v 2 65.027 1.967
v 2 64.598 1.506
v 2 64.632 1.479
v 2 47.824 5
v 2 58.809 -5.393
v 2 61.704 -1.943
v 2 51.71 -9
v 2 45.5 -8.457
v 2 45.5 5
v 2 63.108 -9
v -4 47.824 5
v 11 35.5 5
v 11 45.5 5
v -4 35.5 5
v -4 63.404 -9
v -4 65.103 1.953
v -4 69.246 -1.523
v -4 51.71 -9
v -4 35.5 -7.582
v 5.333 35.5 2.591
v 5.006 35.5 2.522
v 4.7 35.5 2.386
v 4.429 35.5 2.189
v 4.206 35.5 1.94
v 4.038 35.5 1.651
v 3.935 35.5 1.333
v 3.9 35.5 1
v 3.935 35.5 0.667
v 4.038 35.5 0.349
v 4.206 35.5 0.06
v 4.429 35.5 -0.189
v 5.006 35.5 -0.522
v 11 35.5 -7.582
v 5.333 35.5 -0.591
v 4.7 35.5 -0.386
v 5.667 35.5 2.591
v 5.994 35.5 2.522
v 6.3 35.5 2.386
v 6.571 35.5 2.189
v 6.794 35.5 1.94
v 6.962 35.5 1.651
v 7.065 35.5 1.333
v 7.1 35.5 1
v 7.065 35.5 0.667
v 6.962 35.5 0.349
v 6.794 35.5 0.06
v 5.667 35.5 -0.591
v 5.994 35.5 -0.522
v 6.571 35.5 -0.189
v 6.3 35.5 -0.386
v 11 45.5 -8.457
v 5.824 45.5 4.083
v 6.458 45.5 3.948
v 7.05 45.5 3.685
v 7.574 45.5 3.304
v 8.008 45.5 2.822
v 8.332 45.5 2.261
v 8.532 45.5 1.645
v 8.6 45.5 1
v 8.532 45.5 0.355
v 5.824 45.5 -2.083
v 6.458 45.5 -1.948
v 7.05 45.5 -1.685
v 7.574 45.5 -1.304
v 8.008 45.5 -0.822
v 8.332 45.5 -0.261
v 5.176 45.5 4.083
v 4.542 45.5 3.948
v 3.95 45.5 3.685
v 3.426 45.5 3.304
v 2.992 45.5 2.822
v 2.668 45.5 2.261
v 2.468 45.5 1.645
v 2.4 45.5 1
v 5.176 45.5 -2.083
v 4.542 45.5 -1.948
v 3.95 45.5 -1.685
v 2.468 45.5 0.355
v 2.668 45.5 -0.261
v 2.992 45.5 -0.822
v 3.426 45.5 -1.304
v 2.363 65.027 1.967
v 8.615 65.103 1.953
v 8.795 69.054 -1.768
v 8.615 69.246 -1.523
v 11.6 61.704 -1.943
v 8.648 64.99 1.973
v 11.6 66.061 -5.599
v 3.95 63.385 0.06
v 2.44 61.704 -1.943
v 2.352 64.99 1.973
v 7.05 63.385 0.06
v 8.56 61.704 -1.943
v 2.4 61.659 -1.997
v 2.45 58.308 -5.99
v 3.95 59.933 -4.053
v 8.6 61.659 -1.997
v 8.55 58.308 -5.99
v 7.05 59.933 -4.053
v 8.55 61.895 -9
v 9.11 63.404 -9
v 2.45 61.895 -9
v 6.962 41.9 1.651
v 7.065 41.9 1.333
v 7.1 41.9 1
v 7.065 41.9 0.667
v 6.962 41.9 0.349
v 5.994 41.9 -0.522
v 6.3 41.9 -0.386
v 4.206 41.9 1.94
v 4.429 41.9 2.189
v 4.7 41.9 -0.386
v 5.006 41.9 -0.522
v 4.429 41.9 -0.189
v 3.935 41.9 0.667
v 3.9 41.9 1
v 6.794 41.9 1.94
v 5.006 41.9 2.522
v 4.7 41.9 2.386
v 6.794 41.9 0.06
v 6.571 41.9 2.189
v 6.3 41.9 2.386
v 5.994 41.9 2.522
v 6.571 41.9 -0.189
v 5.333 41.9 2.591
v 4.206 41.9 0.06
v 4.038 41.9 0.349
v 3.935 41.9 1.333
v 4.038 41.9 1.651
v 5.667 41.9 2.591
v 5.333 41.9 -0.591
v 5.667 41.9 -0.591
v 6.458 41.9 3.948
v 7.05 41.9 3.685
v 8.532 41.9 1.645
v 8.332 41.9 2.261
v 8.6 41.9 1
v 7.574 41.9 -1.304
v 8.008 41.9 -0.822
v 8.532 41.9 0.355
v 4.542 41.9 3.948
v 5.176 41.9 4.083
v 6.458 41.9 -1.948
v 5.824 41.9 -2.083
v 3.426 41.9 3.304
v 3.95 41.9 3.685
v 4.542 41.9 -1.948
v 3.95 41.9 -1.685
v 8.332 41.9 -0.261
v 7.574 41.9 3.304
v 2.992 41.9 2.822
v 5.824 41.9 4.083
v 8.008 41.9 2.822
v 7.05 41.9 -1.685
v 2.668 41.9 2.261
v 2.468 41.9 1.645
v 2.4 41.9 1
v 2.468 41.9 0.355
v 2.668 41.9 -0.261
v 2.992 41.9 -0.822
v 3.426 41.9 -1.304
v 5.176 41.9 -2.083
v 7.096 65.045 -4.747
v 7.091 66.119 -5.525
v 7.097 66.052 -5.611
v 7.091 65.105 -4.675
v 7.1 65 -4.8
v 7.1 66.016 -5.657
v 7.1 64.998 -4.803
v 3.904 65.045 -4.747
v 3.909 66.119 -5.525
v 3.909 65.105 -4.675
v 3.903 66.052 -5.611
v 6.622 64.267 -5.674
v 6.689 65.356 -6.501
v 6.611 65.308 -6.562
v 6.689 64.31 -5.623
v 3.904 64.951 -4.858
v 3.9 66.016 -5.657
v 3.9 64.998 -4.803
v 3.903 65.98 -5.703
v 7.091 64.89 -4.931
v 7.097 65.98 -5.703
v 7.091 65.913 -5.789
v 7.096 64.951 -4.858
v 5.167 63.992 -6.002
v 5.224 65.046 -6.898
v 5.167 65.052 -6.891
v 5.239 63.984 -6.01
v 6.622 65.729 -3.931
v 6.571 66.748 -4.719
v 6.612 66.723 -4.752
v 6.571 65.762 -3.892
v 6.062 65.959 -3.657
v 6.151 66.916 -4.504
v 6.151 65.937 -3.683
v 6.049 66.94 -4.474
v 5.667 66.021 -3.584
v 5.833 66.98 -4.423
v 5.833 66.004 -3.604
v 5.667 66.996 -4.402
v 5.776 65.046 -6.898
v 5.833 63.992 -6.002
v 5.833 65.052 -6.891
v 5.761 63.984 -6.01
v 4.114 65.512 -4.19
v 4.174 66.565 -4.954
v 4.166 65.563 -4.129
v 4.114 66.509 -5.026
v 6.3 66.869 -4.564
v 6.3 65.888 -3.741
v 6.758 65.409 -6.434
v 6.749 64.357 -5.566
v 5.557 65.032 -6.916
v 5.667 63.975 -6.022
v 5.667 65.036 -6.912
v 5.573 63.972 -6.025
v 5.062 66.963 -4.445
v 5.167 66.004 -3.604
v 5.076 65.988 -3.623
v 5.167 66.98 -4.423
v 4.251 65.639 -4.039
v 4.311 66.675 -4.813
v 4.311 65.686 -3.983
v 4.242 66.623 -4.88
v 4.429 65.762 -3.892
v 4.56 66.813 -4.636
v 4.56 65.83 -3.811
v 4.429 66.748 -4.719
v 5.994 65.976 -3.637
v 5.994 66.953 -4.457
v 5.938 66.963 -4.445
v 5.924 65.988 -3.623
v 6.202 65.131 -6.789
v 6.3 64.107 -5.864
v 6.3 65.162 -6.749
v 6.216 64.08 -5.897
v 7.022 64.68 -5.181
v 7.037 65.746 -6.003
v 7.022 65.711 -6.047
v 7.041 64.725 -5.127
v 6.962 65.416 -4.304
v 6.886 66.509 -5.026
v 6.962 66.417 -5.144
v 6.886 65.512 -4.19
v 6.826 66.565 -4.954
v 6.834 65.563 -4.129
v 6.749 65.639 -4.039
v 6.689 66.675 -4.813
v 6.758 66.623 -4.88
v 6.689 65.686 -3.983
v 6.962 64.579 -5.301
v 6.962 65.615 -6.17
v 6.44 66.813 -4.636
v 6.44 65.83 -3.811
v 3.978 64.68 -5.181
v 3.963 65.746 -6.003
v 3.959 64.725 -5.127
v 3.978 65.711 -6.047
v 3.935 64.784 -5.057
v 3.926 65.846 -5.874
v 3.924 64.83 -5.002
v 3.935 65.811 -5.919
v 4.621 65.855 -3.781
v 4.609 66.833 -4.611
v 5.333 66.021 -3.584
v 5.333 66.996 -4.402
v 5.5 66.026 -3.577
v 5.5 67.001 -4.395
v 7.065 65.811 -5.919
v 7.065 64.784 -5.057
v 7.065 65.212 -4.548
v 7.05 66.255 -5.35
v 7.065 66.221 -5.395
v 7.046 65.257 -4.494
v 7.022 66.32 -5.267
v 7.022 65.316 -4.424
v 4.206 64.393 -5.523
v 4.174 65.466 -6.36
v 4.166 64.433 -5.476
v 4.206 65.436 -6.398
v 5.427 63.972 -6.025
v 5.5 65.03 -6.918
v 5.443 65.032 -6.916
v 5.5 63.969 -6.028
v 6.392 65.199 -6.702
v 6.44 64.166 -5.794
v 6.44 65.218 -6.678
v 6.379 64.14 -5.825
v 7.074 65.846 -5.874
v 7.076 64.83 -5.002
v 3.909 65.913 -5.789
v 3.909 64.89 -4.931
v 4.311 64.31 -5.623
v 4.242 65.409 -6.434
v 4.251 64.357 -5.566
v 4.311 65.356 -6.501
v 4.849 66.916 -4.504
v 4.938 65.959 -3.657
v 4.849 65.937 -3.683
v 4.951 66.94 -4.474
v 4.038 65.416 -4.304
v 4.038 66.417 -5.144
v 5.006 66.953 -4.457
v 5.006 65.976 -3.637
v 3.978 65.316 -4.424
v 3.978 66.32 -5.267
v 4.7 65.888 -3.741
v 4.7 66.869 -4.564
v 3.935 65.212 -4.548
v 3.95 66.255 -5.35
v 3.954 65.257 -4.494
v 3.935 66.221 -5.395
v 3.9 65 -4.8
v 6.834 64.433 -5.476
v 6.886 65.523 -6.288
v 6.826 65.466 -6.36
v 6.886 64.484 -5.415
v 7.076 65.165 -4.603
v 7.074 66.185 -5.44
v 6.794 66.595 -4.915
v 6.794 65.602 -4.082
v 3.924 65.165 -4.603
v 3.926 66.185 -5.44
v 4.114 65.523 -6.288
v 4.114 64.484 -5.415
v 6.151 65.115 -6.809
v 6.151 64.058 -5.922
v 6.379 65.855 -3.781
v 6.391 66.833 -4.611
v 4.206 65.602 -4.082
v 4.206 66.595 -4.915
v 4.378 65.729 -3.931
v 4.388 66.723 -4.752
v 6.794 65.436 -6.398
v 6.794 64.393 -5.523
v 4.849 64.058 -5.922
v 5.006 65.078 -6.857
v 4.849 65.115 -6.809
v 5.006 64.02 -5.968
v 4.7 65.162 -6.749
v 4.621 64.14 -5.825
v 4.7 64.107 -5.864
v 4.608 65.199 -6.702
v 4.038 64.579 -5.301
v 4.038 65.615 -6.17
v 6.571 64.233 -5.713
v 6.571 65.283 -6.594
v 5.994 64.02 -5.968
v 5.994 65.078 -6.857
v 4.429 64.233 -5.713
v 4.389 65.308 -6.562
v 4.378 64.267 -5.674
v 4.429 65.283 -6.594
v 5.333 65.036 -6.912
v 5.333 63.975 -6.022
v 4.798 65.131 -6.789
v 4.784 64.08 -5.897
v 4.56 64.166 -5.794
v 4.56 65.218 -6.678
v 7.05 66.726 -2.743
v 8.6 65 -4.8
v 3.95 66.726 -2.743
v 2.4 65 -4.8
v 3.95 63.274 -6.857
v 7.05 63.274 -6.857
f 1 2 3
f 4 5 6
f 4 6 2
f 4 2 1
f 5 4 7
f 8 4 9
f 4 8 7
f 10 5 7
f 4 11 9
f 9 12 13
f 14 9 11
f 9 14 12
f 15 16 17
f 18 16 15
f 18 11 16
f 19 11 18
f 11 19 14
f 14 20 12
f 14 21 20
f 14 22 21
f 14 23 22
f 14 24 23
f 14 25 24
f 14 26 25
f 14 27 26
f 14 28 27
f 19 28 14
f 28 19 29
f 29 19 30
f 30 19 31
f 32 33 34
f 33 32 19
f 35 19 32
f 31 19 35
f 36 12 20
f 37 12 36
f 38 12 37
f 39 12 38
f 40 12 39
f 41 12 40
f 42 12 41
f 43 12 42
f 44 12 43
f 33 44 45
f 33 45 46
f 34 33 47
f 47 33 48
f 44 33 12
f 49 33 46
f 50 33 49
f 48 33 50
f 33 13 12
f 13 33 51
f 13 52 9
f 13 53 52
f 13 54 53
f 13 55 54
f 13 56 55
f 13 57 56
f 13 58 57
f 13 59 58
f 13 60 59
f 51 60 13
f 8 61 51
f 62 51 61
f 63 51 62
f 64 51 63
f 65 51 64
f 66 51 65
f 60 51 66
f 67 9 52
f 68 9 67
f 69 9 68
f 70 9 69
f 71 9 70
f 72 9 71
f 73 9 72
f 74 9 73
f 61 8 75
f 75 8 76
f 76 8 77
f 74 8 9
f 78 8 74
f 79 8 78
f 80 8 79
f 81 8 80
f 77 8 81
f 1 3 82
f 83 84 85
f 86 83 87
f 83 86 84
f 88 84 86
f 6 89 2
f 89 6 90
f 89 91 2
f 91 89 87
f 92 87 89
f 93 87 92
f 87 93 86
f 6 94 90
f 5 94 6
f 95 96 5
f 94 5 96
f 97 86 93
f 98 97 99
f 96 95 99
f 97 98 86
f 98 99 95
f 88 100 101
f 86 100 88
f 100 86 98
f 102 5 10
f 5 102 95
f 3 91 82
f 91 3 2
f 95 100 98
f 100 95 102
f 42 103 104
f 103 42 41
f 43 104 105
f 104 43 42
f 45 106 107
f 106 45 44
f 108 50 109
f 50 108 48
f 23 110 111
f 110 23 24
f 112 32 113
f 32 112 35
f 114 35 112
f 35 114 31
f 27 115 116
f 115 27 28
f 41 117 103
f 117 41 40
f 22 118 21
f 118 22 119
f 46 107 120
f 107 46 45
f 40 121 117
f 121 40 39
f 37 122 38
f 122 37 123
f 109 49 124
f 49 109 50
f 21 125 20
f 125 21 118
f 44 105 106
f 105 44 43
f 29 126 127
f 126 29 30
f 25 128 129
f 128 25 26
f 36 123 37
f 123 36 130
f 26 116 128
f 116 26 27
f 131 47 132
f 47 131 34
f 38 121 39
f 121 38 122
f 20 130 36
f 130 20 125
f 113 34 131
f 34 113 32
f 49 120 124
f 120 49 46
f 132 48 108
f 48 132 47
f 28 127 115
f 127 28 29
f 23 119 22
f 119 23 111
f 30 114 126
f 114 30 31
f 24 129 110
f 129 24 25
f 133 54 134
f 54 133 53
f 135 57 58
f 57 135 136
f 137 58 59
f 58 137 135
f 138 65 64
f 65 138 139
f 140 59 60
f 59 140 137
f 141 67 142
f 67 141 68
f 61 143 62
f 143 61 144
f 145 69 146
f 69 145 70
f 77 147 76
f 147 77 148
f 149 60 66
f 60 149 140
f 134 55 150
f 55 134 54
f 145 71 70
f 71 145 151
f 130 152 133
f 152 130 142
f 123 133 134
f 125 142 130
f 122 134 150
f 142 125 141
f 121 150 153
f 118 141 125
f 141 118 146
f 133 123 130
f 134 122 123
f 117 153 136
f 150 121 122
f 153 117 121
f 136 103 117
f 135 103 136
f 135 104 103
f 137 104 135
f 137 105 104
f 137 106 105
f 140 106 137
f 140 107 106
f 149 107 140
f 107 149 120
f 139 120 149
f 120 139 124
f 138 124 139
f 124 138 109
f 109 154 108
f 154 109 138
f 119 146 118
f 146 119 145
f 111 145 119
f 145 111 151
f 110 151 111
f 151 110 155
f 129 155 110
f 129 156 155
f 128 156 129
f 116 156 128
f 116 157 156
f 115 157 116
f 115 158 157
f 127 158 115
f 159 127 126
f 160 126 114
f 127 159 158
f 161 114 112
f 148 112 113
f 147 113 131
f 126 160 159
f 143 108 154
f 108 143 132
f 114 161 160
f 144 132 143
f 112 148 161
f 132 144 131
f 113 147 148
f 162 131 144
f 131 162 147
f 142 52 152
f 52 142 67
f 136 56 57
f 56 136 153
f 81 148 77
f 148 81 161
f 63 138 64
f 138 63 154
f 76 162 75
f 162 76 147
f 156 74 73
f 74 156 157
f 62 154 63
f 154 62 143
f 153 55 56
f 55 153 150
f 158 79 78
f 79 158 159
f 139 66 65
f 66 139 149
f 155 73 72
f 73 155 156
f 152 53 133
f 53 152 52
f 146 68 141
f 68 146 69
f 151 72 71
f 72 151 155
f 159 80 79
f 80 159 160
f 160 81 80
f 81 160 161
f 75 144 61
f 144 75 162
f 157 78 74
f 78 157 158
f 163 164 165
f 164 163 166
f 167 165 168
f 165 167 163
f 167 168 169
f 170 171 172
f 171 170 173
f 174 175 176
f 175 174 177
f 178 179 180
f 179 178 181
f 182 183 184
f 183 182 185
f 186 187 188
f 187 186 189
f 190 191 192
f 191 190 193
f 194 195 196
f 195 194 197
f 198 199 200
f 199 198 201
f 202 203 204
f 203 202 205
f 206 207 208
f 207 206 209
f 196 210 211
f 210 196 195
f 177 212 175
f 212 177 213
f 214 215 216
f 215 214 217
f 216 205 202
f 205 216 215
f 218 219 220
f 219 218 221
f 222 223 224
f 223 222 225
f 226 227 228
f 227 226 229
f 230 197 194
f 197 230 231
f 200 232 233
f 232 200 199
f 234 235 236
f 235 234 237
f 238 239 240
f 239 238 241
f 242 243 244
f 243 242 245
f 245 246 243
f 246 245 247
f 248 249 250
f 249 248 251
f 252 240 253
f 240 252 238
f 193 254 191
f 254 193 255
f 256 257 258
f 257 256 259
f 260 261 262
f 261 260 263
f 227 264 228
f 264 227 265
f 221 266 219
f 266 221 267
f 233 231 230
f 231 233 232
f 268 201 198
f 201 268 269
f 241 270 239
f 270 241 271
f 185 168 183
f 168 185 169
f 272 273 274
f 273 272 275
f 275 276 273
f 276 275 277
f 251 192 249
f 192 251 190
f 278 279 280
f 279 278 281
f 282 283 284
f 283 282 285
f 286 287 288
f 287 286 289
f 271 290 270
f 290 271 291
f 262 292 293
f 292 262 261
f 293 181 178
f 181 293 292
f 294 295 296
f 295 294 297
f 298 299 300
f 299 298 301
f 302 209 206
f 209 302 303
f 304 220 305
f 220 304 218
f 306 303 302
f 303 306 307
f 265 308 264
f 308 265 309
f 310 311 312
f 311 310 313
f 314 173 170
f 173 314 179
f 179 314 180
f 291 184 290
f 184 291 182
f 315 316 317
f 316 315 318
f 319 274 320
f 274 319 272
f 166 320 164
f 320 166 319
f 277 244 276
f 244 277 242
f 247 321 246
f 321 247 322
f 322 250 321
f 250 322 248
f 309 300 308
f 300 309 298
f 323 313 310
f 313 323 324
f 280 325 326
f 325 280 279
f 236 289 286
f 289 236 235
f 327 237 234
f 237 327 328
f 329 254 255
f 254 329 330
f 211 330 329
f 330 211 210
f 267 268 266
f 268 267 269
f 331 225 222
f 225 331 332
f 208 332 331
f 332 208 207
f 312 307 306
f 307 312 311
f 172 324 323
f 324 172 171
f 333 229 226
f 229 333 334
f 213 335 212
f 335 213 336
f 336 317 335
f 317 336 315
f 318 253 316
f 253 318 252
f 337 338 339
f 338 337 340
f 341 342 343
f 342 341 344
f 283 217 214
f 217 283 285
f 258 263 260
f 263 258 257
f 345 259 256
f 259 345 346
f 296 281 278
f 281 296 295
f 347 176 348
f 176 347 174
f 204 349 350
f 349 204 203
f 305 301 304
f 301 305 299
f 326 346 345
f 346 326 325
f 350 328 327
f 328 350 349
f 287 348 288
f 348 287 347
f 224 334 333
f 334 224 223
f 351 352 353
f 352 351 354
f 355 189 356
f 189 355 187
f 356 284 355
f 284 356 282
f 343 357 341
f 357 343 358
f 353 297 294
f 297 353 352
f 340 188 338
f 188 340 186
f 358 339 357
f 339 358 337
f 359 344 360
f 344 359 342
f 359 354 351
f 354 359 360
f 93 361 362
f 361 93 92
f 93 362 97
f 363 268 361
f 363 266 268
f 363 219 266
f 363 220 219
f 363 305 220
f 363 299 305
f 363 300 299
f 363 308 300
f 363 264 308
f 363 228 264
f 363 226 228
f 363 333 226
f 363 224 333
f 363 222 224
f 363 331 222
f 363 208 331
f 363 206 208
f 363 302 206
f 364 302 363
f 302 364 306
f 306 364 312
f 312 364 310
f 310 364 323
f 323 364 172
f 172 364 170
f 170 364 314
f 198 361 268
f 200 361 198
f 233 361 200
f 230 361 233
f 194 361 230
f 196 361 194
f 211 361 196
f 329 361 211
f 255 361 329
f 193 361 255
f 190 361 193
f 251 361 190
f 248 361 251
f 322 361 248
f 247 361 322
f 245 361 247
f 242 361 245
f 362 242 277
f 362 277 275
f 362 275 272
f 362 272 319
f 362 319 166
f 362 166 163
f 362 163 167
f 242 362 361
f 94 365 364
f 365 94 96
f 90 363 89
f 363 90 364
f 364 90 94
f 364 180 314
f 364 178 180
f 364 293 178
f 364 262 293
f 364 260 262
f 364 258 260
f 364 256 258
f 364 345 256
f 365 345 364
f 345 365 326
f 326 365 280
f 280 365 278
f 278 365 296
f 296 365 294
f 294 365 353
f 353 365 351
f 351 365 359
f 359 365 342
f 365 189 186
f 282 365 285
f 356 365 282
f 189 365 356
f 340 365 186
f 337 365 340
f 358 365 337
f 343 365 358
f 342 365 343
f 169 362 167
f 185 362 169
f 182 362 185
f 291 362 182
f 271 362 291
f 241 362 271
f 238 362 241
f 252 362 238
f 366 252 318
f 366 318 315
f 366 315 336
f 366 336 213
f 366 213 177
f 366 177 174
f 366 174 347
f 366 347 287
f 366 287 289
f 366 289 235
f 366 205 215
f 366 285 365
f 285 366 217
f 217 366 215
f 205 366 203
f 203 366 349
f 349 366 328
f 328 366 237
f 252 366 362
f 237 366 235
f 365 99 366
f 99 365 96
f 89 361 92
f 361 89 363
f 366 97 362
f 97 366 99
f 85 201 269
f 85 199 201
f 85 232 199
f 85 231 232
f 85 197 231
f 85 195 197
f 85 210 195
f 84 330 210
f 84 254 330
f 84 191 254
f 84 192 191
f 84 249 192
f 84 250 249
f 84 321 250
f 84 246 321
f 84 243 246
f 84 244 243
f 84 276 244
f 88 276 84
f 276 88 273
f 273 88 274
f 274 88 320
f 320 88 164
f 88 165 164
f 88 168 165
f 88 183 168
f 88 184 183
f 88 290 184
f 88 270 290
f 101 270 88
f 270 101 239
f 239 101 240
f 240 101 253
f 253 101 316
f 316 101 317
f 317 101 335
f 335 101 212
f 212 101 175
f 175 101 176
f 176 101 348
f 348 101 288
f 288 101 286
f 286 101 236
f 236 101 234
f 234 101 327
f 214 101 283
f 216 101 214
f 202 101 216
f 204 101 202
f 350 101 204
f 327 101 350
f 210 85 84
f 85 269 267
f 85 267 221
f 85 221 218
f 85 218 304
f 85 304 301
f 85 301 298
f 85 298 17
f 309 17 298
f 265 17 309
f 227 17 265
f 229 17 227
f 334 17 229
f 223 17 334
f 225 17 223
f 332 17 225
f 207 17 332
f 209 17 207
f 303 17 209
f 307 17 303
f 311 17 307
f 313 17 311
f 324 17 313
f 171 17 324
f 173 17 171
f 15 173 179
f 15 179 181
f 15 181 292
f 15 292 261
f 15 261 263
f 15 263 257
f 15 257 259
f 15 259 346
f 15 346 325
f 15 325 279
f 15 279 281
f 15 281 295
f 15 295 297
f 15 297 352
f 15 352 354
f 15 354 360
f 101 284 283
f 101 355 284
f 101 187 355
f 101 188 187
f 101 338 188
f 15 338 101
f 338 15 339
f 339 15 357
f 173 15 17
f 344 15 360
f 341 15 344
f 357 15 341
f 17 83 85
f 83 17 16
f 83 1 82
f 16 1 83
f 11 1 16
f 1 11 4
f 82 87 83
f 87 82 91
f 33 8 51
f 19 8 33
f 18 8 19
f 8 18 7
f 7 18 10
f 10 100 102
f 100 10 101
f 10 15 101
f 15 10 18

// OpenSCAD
//#import("nozzle-fan.stl");
//#translate([0,-4.5,0]) rotate([90,0,180]) import("extruder-body.stl");
//translate([0,-4.5,0]) rotate([90,0,0]) import("extruder-cover.stl");
//translate([0,0,0]) rotate([0,0,0]) import("hot21_45_2.stl");
//use<nozzle-fan-old.scad>;
//%rotate([90,0,0]) fan_nozzle_old();

module nozzle_fan_holder() {
    difference()
    {
    union()
    {
        translate([-4,35.5,-25]) cube([6,45,30]);
        translate([-4,35.5,-25]) cube([15,10,30]);
        translate([-4,68,-12]) rotate([51,0,0]) cube([10,15,11.1]);
        translate([5.5,66.3,-5.8]) rotate([50,0,0])  cylinder(r=6.1,h = 6, $fn=6);
    }


    translate([5.5,42,1]) rotate([90,0,0])  cylinder(r=1.6,h = 10, $fn=30);
    translate([5.5,46.9,1]) rotate([90,0,0])  cylinder(r=3.1,h = 5, $fn=30);

    //#translate([5.5,70,-7]) rotate([50,0,0])  cylinder(r=1.6,h = 15, $fn=60);
     translate([5.5,70,-9]) rotate([50,0,0])  cylinder(r=1.6,h = 15, $fn=60);
     translate([5.5,65,-4.8]) rotate([50,0,0])  cylinder(r=3.1,h = 17, $fn=6);


    translate([-25,46.5,-55]) rotate([52,0,0]) cube([50,150,15]);
    translate([-25,46.5,-66]) rotate([50,0,0]) cube([50,150,15]);
    translate([-25,86,4]) rotate([50+90,0,0]) cube([50,150,15]);
    translate([-25,86,13.5]) rotate([170,0,0]) cube([50,150,15]);
    translate([-25,86,-12]) rotate([175,0,0]) cube([50,150,15]);

    translate([-5,35,-25]) cube([20,45,16]);

    }
}

nozzle_fan_holder();
